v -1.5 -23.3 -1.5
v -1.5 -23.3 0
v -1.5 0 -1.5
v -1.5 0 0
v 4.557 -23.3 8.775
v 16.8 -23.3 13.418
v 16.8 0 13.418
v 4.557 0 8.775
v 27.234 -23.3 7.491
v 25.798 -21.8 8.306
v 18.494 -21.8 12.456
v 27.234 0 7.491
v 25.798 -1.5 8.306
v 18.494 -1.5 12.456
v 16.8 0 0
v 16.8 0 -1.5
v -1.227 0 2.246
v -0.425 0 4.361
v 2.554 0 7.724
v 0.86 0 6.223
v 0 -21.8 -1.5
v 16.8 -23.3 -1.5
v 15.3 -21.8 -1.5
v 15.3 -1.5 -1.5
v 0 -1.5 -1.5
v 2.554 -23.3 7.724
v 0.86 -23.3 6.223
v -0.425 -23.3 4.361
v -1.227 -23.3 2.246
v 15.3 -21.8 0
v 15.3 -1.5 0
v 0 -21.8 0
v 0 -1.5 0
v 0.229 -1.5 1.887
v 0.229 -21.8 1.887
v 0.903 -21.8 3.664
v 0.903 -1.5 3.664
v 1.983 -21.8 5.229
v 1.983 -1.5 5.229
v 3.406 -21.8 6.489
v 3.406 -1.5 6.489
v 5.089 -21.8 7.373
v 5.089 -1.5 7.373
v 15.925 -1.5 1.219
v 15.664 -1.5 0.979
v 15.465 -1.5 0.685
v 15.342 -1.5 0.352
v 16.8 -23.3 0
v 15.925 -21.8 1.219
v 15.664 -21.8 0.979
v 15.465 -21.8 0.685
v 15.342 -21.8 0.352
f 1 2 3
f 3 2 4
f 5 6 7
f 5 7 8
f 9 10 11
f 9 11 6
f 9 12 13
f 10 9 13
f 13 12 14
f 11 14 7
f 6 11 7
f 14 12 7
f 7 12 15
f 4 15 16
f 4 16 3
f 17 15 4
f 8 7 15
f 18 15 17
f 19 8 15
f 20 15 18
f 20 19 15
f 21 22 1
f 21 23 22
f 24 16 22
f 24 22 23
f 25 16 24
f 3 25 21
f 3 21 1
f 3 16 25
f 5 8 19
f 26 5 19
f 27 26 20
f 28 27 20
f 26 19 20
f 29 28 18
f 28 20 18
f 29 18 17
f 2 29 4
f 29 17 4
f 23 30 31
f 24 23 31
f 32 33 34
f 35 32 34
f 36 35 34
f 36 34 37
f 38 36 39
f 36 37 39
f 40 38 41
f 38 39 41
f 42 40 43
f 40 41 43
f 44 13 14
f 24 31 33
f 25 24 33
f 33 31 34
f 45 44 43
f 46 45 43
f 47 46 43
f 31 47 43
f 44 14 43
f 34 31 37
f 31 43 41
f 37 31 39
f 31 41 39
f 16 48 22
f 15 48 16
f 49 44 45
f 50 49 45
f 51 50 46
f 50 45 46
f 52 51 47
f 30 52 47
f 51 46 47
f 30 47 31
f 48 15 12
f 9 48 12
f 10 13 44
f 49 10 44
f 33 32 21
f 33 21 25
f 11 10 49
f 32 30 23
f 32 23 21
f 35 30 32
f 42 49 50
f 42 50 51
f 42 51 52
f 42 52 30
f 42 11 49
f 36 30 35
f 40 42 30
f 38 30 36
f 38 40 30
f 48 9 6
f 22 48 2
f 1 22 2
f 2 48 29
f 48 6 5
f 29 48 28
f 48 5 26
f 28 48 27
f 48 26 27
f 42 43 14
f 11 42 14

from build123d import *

# Parameters (mm, degrees)
EXTRUDE_2_DEPTH     = 23.3
CUT_EXTRUDE_1_DEPTH = 20.3
SKETCH_5_W          = 18.3
SKETCH_5_H          = 23.3
SKETCH_5_W_2        = 15.3
SKETCH_5_H_2        = 20.3
EXTRUDE_3_DEPTH     = 1.5


with BuildPart() as part:
    # 草圖3 → 填料-伸長2 (new body)
    with BuildSketch(Plane(origin=(0, 0, 0), x_dir=(1, 0, 0), z_dir=(0, 1, 0))):
        with BuildLine():
            Line((-1.5, 0), (16.8, 0))
            Line((16.8, 0), (27.234104494, -7.490738748))
            Line((27.234104494, -7.490738748), (16.8, -13.417750086))
            Line((16.8, -13.417750086), (4.557217445, -8.775105803))
            ThreePointArc((4.557217445, -8.775105803), (0.161354932, -5.331331096), (-1.5, 0))
        make_face()
    extrude(amount=-EXTRUDE_2_DEPTH)

    # 草圖4 → 除料-伸長1 (cut)
    with BuildSketch(Plane(origin=(0, -1.5, 0), x_dir=(1, 0, 0), z_dir=(0, 1, 0))):
        with BuildLine():
            Line((25.798187114, -8.30640037), (15.925221667, -1.21850846))
            ThreePointArc((15.925221667, -1.21850846), (15.465427503, -0.684774598), (15.3, 0))
            Line((15.3, 0), (0, 0))
            ThreePointArc((0, 0), (1.395817627, -4.479214992), (5.089081639, -7.37256508))
            Line((5.089081639, -7.37256508), (18.493554713, -12.455739595))
            Line((18.493554713, -12.455739595), (25.798187114, -8.30640037))
        make_face()
    extrude(amount=-CUT_EXTRUDE_1_DEPTH, mode=Mode.SUBTRACT)

    # 草圖5 → 填料-伸長3 (add)
    with BuildSketch(Plane(origin=(0, 0, 0), x_dir=(-1, 0, 0), z_dir=(0, 0, -1))):
        with Locations((-7.65, -11.65)):
            Rectangle(SKETCH_5_W, SKETCH_5_H)
        with Locations((-7.65, -11.65)):
            Rectangle(SKETCH_5_W_2, SKETCH_5_H_2, mode=Mode.SUBTRACT)
    extrude(amount=EXTRUDE_3_DEPTH)


solid = part.part
